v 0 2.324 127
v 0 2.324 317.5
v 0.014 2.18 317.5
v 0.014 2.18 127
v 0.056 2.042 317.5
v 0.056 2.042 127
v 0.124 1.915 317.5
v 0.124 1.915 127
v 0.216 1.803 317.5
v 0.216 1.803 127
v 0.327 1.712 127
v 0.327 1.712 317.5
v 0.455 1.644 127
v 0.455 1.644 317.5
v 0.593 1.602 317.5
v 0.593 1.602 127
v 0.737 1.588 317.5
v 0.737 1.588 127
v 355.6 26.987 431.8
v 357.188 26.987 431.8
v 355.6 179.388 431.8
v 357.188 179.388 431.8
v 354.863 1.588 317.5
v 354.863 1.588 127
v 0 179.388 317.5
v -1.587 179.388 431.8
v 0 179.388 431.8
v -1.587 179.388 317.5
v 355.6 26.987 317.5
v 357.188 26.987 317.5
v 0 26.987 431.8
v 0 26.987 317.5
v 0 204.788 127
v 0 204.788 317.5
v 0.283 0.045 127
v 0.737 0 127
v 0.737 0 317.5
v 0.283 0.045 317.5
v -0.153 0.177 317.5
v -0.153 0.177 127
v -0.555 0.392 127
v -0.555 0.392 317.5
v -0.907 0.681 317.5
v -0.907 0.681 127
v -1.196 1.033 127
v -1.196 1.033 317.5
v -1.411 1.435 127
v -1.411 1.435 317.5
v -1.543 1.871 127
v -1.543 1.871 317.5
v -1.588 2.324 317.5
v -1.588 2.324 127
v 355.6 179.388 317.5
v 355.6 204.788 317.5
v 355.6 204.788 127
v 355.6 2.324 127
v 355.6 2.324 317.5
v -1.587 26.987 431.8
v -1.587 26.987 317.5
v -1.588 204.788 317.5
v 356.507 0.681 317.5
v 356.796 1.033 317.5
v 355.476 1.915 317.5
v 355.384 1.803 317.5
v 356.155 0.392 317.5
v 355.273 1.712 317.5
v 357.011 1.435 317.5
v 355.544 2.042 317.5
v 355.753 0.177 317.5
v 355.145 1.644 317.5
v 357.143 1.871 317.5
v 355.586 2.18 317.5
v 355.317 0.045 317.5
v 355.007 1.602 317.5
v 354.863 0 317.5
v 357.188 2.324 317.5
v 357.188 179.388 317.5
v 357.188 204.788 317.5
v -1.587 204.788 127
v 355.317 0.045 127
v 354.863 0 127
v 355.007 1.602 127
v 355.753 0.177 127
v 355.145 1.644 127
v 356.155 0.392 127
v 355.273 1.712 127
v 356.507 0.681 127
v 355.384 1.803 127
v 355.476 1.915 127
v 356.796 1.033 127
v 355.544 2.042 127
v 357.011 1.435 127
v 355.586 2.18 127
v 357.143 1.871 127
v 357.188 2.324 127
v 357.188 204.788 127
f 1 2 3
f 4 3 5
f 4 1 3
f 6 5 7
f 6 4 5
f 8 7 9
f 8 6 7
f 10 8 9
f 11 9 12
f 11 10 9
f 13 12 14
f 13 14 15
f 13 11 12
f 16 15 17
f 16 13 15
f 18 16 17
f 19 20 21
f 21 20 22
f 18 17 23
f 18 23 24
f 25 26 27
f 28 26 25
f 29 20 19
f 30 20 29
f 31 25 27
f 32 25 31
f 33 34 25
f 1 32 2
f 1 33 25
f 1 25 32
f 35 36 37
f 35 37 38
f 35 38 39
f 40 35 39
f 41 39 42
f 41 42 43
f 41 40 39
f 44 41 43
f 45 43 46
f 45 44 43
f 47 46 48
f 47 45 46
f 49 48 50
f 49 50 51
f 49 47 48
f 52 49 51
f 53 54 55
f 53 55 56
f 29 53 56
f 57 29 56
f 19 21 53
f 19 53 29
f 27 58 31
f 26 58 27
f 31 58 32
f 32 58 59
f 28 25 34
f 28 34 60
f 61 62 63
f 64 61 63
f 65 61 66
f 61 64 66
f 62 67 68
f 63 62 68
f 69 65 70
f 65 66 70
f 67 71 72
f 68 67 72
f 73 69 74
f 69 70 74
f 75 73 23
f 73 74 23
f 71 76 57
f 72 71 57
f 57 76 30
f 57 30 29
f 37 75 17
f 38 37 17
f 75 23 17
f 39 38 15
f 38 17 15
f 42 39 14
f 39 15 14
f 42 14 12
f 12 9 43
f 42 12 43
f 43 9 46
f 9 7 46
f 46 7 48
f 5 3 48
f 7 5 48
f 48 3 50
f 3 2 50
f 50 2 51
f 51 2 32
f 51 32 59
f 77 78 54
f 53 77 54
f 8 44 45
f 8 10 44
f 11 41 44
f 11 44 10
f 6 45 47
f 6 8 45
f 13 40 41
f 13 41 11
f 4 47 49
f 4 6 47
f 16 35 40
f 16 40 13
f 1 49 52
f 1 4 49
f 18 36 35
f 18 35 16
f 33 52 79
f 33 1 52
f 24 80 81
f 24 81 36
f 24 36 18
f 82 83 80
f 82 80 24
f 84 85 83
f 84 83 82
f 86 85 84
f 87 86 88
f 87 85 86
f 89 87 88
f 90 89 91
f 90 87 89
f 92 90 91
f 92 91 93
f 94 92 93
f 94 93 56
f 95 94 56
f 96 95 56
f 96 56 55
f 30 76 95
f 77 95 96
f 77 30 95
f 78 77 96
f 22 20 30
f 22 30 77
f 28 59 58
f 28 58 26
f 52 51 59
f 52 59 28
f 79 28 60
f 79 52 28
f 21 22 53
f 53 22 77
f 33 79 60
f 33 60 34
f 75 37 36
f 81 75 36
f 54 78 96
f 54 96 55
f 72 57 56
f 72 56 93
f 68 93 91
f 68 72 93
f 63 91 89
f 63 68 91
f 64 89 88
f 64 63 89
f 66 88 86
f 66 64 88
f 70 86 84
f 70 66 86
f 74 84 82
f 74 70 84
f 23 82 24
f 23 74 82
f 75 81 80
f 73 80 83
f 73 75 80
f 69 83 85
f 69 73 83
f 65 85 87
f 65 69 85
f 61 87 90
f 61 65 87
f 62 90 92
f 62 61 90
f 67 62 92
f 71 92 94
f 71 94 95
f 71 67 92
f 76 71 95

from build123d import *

# Parameters (mm, degrees)
SKETCH1_W                      = 317.5
SKETCH1_H                      = 1.5875
BASE_FLANGE1_DEPTH             = 355.6
EDGE_FLANGE1_STRIP_W           = 7.8232
EDGE_FLANGE1_STRIP_H           = 1.5875
EDGE_FLANGE1_STRIP_CUT_DEPTH   = 317.5
EDGE_FLANGE1_STRIP_2_W         = 7.8232
EDGE_FLANGE1_STRIP_2_H         = 1.5875
EDGE_FLANGE1_STRIP_CUT_2_DEPTH = 317.5
EDGE_FLANGE1_DEPTH             = 317.5
EDGE_FLANGE1_BEND_DEPTH        = 317.5
SKETCH8_W                      = 114.3
SKETCH8_H                      = 152.4
BOSS_EXTRUDE1_DEPTH            = 1.5875
SKETCH10_W                     = 127
SKETCH10_H                     = 254
CUT_EXTRUDE1_DEPTH             = 598.585693253


# Sheet-metal steps are written as plain solids
with BuildPart() as part:
    # Sketch1 → Base-Flange1 (new body)
    with BuildSketch(Plane(origin=(0, 0, 0), x_dir=(0, 0, -1), z_dir=(1, 0, 0))):
        with Locations((-158.75, 0.79375)):
            Rectangle(SKETCH1_W, SKETCH1_H)
    extrude(amount=BASE_FLANGE1_DEPTH)

    # Edge-Flange1 strip (across the edge) → Edge-Flange1 strip cut (cut)
    with BuildSketch(Plane(origin=(355.6, 1.5875, 317.5), x_dir=(-1, 0, 0), z_dir=(0, 0, -1))):
        with Locations((-3.175, -0.79375)):
            Rectangle(EDGE_FLANGE1_STRIP_W, EDGE_FLANGE1_STRIP_H)
    extrude(amount=EDGE_FLANGE1_STRIP_CUT_DEPTH, mode=Mode.SUBTRACT)

    # Edge-Flange1 strip 2 (across the edge) → Edge-Flange1 strip cut 2 (cut)
    with BuildSketch(Plane(origin=(0, 1.5875, 0), x_dir=(1, 0, 0), z_dir=(0, 0, 1))):
        with Locations((-3.175, -0.79375)):
            Rectangle(EDGE_FLANGE1_STRIP_2_W, EDGE_FLANGE1_STRIP_2_H)
    extrude(amount=EDGE_FLANGE1_STRIP_CUT_2_DEPTH, mode=Mode.SUBTRACT)

    # Edge-Flange1 section (across the edge) → Edge-Flange1 (add)
    with BuildSketch(Plane(origin=(355.6, 1.5875, 317.5), x_dir=(-1, 0, 0), z_dir=(0, 0, -1))):
        with BuildLine():
            Line((-1.5875, 0.7366), (-1.5875, 203.2))
            Line((-1.5875, 203.2), (0, 203.2))
            Line((0, 203.2), (0, 0.7366))
            ThreePointArc((0, 0.7366), (0.215745145, 0.215745145), (0.7366, 0))
            Line((0.7366, 0), (0.7366, -1.5875))
            ThreePointArc((0.7366, -1.5875), (-0.90678687, -0.90678687), (-1.5875, 0.7366))
        make_face()
    extrude(amount=EDGE_FLANGE1_DEPTH)

    # Edge-Flange1 section 2 (across the edge) → Edge-Flange1 bend (add)
    with BuildSketch(Plane(origin=(0, 1.5875, 0), x_dir=(1, 0, 0), z_dir=(0, 0, 1))):
        with BuildLine():
            Line((-1.5875, 0.7366), (-1.5875, 203.2))
            Line((-1.5875, 203.2), (0, 203.2))
            Line((0, 203.2), (0, 0.7366))
            ThreePointArc((0, 0.7366), (0.215745145, 0.215745145), (0.7366, 0))
            Line((0.7366, 0), (0.7366, -1.5875))
            ThreePointArc((0.7366, -1.5875), (-0.90678687, -0.90678687), (-1.5875, 0.7366))
        make_face()
    extrude(amount=EDGE_FLANGE1_BEND_DEPTH)


with BuildPart() as body_2:
    # Sketch8 → Boss-Extrude1 (new body)
    with BuildSketch(Plane(origin=(357.1875, 0, 0), x_dir=(0, 0, -1), z_dir=(1, 0, 0))):
        with Locations((-374.65, 103.1875)):
            Rectangle(SKETCH8_W, SKETCH8_H)
    extrude(amount=-BOSS_EXTRUDE1_DEPTH)


with BuildPart() as body_3:
    # Mirror1: mirrored copy
    add(body_2.part.mirror(Plane(origin=(177.8, 0, 0), x_dir=(0, 0, 1), z_dir=(1, 0, 0))))


with BuildPart() as body_2_1:
    add(body_2.part)

    # Combine1: union part, body 3
    add(part.part)
    add(body_3.part)

    # Sketch10 → Cut-Extrude1 (cut, through all)
    with BuildSketch(Plane(origin=(357.1875, 0, 0), x_dir=(0, 0, -1), z_dir=(1, 0, 0))):
        with Locations((-63.5, 77.7875)):
            Rectangle(SKETCH10_W, SKETCH10_H)
    extrude(amount=-CUT_EXTRUDE1_DEPTH, mode=Mode.SUBTRACT)


solid = body_2_1.part
